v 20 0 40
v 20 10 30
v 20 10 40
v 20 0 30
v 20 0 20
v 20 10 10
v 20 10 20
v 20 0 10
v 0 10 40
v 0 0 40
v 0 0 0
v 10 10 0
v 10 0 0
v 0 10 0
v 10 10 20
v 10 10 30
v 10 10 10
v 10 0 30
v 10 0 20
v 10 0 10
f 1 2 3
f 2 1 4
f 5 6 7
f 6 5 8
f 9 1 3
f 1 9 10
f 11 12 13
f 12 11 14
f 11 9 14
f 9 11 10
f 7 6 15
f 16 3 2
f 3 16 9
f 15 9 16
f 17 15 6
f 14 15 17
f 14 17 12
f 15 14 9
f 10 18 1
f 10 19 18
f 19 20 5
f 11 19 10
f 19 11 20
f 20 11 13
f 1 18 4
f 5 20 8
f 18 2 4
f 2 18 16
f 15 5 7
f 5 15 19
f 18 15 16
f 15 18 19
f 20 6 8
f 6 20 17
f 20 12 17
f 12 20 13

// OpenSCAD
difference() {
	cube([20, 10, 40]);
	translate([10, 0, 20]) {
		cube([10, 10, 10]);
	}
	translate([10, 0, 0]) {
		cube([10, 10, 10]);
	}
}
